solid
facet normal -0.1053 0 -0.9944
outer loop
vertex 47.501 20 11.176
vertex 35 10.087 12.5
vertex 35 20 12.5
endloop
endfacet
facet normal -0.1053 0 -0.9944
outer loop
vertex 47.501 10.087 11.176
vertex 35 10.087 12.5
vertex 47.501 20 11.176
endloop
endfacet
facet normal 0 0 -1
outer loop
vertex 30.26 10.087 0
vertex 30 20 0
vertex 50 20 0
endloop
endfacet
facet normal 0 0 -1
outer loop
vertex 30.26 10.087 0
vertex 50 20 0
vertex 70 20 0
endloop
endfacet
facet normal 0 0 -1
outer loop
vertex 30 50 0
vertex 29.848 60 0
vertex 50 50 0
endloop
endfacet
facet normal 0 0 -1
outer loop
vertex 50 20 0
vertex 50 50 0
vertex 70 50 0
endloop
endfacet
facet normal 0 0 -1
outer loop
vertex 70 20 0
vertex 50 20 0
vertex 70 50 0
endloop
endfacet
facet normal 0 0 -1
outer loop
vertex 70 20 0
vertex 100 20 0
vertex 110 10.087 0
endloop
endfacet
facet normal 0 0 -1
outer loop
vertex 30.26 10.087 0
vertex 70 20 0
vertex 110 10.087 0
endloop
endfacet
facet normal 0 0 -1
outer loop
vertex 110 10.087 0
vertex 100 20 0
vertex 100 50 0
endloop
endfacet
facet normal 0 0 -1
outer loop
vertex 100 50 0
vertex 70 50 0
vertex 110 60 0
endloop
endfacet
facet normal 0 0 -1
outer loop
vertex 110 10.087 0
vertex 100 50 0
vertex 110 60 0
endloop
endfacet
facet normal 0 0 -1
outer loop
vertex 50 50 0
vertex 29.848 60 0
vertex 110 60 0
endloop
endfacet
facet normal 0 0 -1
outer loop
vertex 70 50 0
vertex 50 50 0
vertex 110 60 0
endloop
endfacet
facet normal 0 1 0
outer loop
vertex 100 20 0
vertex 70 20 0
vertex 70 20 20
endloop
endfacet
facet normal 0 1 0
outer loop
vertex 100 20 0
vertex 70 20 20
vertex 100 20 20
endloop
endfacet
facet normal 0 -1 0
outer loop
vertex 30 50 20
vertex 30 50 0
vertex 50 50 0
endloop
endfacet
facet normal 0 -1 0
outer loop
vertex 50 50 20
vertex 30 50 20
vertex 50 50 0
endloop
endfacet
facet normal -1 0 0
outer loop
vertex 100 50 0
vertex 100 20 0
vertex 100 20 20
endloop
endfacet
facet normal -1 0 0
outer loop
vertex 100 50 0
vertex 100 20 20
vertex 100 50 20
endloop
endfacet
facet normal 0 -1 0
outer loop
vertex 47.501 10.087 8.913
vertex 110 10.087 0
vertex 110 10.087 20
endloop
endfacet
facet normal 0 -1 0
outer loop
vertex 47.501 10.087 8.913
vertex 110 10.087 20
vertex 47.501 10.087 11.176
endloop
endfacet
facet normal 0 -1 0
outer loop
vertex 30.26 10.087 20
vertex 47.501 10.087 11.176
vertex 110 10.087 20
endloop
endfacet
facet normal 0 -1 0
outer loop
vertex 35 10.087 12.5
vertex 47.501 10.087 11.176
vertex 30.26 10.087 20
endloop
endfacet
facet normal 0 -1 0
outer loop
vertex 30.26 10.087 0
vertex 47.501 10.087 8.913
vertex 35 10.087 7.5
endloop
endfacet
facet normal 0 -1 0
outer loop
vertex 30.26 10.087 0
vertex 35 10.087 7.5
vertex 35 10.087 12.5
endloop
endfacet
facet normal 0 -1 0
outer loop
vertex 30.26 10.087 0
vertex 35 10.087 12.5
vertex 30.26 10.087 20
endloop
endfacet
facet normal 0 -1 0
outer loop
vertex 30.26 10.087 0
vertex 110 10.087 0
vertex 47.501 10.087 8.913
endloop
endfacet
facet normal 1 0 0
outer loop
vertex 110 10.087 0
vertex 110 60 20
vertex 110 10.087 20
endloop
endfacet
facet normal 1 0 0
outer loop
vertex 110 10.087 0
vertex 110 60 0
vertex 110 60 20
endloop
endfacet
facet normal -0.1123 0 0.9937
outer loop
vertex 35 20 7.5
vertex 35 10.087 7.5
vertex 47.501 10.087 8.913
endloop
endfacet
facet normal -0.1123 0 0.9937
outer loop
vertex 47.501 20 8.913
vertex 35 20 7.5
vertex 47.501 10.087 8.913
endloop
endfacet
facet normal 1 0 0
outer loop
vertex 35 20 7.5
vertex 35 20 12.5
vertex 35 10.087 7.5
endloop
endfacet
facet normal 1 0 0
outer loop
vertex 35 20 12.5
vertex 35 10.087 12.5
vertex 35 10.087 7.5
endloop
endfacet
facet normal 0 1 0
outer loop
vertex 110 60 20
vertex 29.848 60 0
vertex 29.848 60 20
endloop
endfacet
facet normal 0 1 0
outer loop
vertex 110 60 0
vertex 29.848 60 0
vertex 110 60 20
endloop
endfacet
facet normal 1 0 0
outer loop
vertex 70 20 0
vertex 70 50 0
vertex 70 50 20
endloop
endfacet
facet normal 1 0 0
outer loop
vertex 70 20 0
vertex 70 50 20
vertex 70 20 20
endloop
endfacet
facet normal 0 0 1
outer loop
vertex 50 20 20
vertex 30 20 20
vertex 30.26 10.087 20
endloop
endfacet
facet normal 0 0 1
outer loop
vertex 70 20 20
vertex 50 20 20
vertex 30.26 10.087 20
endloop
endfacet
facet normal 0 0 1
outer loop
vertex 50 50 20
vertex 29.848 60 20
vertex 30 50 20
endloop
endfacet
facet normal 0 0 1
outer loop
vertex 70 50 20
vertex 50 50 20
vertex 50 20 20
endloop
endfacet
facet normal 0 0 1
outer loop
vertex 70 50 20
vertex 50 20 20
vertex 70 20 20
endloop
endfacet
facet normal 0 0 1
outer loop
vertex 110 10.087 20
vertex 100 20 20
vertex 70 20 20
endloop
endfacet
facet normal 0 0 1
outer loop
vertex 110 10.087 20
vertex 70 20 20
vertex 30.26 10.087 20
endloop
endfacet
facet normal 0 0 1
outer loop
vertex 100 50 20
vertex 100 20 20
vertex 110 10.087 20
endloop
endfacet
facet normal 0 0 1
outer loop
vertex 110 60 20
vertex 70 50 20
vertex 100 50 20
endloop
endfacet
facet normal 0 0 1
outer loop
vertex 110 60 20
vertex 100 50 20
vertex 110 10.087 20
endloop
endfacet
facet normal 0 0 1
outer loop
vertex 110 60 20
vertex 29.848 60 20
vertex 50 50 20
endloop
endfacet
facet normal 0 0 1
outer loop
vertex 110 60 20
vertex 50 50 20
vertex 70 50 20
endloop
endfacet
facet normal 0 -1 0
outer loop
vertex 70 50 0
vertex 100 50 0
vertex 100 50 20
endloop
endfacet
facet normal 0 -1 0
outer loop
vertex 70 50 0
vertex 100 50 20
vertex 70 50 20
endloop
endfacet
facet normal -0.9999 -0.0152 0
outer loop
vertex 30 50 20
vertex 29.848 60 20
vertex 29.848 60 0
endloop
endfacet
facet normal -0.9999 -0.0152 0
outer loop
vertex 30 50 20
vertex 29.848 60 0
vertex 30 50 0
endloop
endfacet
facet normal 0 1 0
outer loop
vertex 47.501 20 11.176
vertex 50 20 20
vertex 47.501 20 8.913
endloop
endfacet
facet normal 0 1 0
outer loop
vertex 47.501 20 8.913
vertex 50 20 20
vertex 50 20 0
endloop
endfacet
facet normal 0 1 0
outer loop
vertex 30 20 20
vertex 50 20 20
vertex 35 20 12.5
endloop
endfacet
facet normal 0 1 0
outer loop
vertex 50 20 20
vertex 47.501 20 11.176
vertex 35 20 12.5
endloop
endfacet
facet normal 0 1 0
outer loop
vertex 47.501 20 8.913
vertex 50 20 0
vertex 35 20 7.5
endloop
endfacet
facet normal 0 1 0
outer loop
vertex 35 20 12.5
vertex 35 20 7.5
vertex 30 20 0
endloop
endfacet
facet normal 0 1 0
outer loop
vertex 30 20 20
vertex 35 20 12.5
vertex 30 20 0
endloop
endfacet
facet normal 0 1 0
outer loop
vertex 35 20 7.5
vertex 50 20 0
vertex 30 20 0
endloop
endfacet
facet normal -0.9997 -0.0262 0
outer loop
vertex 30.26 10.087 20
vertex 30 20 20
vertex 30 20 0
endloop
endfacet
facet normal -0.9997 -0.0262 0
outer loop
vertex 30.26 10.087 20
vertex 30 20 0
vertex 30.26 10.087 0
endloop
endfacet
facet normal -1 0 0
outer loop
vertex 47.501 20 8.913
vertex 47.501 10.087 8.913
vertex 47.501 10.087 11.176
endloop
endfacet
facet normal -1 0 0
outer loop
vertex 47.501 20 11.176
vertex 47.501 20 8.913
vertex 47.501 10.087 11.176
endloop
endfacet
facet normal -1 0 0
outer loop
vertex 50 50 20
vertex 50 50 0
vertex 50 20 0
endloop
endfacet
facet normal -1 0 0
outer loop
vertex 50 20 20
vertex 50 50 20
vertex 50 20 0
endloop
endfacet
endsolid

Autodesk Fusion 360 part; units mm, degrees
sketch "Sketch1" plane through (0, 0, 0) normal (0, 0, 1) x (1, 0, 0)
  line L0 (29.848, 60) -> (110, 60)
  line L1 (110, 60) -> (110, 10.0866)
  line L2 (110, 10.0866) -> (30.2597, 10.0866)
  line L3 (100, 50) -> (70, 50)
  line L4 (70, 50) -> (70, 20)
  line L5 (70, 20) -> (100, 20)
  line L6 (100, 20) -> (100, 50)
  line L7 (30, 50) -> (50, 50)
  line L8 (50, 50) -> (50, 20)
  line L9 (50, 20) -> (30, 20)
  line L10 (29.848, 60) -> (30, 50)
  line L11 (30, 20) -> (30.2597, 10.0866)
extrude "Extrude1" add sketch "Sketch1" along normal blind 20
sketch "Sketch2" plane through (0, 10.0866, 0) normal (0, -1, 0) x (1, 0, 0)
  line L0 (30.2597, 0) -> (110, 0)
  line L1 (110, 0) -> (110, 20)
  line L2 (110, 20) -> (30.2597, 20)
  line L3 (30.2597, 20) -> (30.2597, 0)
  line L4 (47.5008, 8.9134) -> (47.5008, 11.176)
  line L5 (35, 12.5) -> (35, 7.5)
  line L6 (35, 7.5) -> (47.5008, 8.9134)
  line L7 (35, 12.5) -> (47.5008, 11.176)
  line L8 (47.6079, 8.9255) -> (47.5008, 9.8724)
extrude "Extrude2" cut sketch "Sketch2" against normal blind 11 contours L4 L5 L6 L7
